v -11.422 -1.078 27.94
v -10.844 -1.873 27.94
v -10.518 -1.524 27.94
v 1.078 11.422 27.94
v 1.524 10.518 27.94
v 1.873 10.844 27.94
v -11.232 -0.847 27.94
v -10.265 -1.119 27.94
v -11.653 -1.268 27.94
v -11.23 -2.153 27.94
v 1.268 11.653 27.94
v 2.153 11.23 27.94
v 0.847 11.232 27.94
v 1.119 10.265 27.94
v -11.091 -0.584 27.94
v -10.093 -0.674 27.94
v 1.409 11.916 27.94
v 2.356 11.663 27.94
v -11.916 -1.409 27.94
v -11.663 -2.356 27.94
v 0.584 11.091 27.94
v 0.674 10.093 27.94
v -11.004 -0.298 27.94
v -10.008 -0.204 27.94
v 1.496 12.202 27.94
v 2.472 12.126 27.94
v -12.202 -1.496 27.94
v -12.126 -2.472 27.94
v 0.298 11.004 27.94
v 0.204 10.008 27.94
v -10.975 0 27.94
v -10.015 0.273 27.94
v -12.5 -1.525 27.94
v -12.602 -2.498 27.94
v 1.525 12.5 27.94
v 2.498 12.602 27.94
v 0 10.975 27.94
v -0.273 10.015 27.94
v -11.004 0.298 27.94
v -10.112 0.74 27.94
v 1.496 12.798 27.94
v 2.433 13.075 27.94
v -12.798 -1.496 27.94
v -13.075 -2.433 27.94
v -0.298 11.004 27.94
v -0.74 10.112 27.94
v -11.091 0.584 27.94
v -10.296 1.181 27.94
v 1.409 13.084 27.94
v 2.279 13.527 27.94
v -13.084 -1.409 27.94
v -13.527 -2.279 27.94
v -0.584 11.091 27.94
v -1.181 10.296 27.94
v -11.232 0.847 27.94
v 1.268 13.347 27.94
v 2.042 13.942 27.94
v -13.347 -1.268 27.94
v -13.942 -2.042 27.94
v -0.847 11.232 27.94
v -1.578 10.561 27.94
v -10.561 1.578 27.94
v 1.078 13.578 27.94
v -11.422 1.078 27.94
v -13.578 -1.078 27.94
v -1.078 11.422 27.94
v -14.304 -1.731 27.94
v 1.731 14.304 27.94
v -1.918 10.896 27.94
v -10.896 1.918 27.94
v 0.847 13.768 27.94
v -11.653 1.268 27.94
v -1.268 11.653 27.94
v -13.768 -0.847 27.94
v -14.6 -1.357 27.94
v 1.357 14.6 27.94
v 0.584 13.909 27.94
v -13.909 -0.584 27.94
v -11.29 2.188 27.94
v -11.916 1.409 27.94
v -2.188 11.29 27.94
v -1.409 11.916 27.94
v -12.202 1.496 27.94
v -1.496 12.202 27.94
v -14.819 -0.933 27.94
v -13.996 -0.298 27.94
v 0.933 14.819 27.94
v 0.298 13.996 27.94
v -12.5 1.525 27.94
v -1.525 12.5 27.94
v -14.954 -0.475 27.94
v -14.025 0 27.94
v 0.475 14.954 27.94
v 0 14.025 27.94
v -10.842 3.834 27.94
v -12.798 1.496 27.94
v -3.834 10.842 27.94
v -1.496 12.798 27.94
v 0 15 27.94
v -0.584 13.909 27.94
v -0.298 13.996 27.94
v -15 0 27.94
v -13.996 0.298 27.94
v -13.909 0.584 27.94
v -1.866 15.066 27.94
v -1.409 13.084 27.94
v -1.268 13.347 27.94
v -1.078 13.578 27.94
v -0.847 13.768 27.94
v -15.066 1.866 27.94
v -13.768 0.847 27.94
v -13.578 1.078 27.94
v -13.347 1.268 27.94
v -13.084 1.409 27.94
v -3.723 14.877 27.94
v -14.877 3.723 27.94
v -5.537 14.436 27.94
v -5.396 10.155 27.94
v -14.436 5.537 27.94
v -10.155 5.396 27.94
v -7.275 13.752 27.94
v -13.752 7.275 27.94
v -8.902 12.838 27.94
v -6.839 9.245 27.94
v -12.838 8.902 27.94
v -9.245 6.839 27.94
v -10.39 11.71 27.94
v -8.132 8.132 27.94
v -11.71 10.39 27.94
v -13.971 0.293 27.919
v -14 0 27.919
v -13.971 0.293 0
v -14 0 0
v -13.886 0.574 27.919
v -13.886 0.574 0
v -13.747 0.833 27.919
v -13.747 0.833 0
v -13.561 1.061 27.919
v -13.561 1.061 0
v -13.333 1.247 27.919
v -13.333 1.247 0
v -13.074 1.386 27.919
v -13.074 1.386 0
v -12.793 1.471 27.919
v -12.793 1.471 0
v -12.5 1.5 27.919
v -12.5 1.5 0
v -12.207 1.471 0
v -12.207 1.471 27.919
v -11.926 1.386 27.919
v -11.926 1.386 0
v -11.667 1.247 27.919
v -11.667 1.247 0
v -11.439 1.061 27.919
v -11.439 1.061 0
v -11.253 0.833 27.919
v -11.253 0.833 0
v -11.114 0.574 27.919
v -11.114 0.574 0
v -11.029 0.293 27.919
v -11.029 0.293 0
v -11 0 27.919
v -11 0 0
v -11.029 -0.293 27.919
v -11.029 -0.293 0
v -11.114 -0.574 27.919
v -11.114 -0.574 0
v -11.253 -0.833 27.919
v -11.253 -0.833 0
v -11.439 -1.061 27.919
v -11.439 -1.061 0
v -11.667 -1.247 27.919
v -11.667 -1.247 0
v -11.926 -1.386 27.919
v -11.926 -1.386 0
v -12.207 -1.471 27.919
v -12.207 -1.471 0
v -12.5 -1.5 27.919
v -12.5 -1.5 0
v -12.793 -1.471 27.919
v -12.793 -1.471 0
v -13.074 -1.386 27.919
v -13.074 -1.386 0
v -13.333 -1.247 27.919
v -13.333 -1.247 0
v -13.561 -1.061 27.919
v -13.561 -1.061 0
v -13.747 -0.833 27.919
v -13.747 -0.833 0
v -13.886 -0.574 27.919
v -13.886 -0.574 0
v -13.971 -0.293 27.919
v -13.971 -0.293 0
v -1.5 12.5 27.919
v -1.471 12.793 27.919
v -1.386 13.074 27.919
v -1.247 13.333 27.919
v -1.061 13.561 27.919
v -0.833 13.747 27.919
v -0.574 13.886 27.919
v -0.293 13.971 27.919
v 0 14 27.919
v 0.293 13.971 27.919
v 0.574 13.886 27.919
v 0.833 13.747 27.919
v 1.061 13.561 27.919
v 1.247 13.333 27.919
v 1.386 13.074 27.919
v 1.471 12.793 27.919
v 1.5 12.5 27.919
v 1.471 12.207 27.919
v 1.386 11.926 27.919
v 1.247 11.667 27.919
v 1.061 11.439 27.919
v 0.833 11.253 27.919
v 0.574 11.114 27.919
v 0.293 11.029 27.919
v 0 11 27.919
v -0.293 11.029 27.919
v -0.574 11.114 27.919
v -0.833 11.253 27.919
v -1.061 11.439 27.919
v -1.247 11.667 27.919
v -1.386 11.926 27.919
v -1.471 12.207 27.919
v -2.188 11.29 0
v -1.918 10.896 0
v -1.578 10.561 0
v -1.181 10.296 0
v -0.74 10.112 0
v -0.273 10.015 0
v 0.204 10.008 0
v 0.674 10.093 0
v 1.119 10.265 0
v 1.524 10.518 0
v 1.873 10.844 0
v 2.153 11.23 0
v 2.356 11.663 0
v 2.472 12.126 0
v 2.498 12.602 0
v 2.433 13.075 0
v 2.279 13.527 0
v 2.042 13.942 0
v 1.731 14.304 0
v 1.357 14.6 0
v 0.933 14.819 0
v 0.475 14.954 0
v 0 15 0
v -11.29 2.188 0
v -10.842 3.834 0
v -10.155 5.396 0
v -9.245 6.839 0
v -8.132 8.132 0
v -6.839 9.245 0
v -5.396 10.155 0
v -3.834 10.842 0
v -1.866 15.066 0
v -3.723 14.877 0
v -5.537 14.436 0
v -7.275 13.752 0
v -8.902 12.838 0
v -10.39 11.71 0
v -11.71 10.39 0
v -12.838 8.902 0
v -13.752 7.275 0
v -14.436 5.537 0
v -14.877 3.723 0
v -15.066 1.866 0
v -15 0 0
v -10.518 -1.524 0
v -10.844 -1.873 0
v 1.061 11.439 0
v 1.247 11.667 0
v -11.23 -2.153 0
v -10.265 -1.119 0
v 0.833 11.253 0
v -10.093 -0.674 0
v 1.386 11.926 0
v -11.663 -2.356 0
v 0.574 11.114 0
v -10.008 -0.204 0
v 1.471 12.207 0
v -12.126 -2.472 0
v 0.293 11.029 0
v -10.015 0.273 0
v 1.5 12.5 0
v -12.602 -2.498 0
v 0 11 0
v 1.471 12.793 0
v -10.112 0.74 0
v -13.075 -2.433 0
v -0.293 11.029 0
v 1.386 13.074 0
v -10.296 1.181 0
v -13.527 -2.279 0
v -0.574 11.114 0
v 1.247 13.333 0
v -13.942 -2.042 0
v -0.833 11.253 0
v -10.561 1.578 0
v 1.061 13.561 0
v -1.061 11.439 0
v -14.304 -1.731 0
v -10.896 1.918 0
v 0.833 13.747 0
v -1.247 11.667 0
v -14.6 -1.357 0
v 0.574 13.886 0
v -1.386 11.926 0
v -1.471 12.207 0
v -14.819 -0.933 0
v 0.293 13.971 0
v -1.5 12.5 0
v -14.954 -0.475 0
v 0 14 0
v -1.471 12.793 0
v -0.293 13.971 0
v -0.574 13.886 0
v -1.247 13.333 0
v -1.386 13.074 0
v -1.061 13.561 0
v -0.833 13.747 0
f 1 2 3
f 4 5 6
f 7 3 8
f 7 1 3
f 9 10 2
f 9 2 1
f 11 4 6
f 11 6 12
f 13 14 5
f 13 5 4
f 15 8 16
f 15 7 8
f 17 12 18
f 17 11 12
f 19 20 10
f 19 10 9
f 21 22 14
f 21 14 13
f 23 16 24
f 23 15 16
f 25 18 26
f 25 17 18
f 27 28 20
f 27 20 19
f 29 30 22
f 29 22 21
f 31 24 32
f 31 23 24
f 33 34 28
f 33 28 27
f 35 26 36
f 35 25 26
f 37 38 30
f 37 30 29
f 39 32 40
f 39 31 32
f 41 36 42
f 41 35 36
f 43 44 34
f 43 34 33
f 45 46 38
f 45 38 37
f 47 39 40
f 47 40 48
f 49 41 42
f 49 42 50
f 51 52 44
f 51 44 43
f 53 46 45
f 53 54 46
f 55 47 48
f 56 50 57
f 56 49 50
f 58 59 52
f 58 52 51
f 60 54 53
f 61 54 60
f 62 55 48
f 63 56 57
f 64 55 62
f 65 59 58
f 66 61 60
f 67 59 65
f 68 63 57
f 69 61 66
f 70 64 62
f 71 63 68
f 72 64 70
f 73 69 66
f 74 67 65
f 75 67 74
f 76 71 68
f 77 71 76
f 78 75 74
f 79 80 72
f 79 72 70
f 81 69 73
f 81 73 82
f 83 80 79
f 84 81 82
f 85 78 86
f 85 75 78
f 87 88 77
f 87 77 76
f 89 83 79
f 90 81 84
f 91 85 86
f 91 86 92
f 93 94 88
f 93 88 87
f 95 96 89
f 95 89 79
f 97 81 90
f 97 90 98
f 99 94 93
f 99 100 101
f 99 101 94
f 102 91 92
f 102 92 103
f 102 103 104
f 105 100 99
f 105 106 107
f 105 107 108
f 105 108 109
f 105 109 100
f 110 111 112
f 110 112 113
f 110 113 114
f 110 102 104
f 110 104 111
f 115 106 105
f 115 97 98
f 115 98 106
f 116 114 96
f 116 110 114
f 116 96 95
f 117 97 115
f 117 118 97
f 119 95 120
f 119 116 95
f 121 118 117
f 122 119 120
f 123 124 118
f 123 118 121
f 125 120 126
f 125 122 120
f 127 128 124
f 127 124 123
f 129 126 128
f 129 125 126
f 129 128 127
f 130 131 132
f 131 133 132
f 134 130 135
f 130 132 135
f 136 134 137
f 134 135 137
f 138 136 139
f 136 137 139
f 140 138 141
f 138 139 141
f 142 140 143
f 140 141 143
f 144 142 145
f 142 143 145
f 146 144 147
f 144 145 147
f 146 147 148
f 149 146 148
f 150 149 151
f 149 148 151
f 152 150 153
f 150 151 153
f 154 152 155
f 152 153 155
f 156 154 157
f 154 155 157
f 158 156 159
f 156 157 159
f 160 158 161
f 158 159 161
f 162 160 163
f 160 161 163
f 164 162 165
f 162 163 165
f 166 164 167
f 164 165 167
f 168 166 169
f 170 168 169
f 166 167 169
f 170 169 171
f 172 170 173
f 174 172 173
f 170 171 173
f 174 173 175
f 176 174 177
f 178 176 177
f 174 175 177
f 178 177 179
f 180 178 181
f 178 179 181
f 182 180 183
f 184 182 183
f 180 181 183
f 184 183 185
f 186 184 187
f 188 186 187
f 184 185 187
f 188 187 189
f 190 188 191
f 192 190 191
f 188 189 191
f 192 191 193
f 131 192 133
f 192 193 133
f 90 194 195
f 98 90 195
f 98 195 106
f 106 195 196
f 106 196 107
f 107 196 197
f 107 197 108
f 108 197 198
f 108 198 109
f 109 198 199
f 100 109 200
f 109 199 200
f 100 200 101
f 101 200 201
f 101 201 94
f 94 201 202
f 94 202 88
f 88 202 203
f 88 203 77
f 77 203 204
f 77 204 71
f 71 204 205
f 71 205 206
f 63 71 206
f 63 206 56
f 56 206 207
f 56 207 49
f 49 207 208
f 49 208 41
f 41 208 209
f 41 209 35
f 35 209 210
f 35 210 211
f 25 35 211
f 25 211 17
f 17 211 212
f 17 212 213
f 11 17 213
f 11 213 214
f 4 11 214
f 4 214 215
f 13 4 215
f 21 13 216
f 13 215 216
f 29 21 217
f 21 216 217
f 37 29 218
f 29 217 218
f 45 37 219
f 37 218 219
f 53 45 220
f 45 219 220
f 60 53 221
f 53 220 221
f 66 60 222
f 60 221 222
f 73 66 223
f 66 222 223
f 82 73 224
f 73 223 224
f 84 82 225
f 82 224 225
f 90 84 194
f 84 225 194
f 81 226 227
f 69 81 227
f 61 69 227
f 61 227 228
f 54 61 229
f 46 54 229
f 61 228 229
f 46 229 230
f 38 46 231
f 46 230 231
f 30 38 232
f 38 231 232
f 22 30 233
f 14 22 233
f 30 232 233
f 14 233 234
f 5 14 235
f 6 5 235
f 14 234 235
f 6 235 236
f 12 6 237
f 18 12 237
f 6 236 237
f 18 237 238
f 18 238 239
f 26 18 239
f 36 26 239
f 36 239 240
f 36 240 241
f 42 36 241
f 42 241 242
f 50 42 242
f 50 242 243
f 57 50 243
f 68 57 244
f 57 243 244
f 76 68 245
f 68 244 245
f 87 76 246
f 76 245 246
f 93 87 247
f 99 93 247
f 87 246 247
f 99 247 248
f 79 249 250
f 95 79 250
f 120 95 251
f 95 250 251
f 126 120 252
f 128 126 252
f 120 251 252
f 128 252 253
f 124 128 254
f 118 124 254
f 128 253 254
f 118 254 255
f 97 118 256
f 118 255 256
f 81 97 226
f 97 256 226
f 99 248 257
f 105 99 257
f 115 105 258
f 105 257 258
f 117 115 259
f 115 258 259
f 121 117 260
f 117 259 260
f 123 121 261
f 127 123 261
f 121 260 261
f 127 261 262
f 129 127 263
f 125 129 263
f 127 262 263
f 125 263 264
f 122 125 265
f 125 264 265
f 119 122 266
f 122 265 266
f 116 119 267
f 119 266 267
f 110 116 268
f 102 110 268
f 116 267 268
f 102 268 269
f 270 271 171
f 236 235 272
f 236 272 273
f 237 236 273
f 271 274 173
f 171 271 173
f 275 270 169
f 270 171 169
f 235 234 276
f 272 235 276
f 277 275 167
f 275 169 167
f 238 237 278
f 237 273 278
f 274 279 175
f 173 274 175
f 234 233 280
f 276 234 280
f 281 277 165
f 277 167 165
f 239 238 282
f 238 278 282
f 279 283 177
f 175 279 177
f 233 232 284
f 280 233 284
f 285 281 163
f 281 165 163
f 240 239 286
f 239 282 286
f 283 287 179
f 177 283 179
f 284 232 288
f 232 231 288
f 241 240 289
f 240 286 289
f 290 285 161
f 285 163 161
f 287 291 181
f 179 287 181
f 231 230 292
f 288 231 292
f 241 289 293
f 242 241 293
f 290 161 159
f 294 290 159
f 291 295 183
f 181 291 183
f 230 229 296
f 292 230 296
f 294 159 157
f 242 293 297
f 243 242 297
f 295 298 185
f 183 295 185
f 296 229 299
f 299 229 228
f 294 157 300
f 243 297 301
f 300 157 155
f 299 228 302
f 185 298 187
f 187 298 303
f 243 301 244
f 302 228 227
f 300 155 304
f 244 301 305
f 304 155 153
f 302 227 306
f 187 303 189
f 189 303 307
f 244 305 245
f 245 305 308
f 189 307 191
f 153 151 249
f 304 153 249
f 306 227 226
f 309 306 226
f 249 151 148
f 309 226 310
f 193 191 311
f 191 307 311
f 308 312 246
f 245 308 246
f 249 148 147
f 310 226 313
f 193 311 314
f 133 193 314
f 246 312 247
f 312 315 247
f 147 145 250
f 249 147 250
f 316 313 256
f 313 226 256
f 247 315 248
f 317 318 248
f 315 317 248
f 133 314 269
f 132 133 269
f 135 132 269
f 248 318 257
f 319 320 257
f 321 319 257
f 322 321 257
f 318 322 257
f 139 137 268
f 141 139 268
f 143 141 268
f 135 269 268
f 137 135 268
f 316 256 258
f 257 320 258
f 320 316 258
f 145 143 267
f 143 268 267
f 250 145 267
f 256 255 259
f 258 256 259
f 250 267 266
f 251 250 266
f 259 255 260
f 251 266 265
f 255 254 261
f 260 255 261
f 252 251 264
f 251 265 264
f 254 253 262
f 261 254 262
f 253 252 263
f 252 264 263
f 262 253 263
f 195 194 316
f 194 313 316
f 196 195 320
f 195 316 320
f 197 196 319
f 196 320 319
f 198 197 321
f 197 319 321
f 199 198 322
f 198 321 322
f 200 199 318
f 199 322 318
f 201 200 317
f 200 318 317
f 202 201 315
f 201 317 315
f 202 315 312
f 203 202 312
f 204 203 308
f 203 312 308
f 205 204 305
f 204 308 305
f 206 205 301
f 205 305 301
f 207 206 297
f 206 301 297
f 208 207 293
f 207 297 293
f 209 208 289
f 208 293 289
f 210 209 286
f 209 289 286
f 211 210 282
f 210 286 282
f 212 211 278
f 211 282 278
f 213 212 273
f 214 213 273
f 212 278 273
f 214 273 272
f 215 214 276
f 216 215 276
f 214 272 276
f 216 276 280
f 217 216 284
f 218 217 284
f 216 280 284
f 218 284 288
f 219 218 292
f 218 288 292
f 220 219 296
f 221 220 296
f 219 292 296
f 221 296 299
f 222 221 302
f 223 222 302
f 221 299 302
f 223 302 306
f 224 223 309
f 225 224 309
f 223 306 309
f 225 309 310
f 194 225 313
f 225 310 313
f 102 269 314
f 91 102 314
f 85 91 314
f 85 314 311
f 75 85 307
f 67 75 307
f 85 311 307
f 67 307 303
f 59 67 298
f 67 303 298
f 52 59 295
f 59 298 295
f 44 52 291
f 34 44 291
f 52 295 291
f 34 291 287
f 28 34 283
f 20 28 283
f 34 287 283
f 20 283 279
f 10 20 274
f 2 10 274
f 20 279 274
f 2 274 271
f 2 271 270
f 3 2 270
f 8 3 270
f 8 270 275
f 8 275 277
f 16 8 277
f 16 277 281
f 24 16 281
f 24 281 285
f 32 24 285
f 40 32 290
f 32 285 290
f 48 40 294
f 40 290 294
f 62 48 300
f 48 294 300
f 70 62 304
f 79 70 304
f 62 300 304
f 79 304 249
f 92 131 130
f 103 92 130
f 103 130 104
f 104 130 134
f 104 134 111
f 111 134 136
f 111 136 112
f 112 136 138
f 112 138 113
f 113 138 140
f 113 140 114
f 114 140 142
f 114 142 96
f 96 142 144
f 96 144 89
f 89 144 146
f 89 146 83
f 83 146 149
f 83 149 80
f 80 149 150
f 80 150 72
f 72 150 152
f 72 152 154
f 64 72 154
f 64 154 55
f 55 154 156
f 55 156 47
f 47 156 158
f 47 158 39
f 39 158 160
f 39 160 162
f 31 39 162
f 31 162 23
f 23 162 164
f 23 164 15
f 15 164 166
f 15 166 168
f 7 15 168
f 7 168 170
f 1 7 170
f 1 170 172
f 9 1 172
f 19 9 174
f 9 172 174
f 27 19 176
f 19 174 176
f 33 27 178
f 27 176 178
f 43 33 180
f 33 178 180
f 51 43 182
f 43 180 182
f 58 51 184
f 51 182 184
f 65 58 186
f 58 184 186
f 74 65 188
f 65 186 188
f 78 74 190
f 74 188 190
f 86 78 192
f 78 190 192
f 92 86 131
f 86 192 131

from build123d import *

# Parameters (mm, degrees)
BOSS_EXTRUDE1_DEPTH             = 27.94
F_3_0MM_DOWEL_HOLE1_D           = 3
F_3_0MM_DOWEL_HOLE1_CSINK_D     = 3.05
F_3_0MM_DOWEL_HOLE1_CSINK_ANGLE = 100


with BuildPart() as part:
    # Sketch1 → Boss-Extrude1 (new body)
    with BuildSketch(Plane(origin=(0, 0, 0), x_dir=(0, 1, 0), z_dir=(0, 0, 1))):
        with BuildLine():
            ThreePointArc((0, 15), (-2.153485547, 11.23015749), (2.187669993, 11.29))
            ThreePointArc((2.187669993, 11.29), (8.131727984, 8.131727984), (11.29, 2.187669993))
            ThreePointArc((11.29, 2.187669993), (11.23015749, -2.153485547), (15, 0))
            ThreePointArc((15, 0), (11.072722586, 11.072722586), (0, 15))
        make_face()
    extrude(amount=BOSS_EXTRUDE1_DEPTH)

    # Ø3.0mm Dowel Hole1 (through all)
    with Locations(Plane.XY.offset(27.94)):
        with Locations((0, 12.5), (0, -12.5), (-12.5, 0)):
            CounterSinkHole(F_3_0MM_DOWEL_HOLE1_D / 2, F_3_0MM_DOWEL_HOLE1_CSINK_D / 2, counter_sink_angle=F_3_0MM_DOWEL_HOLE1_CSINK_ANGLE)


solid = part.part
